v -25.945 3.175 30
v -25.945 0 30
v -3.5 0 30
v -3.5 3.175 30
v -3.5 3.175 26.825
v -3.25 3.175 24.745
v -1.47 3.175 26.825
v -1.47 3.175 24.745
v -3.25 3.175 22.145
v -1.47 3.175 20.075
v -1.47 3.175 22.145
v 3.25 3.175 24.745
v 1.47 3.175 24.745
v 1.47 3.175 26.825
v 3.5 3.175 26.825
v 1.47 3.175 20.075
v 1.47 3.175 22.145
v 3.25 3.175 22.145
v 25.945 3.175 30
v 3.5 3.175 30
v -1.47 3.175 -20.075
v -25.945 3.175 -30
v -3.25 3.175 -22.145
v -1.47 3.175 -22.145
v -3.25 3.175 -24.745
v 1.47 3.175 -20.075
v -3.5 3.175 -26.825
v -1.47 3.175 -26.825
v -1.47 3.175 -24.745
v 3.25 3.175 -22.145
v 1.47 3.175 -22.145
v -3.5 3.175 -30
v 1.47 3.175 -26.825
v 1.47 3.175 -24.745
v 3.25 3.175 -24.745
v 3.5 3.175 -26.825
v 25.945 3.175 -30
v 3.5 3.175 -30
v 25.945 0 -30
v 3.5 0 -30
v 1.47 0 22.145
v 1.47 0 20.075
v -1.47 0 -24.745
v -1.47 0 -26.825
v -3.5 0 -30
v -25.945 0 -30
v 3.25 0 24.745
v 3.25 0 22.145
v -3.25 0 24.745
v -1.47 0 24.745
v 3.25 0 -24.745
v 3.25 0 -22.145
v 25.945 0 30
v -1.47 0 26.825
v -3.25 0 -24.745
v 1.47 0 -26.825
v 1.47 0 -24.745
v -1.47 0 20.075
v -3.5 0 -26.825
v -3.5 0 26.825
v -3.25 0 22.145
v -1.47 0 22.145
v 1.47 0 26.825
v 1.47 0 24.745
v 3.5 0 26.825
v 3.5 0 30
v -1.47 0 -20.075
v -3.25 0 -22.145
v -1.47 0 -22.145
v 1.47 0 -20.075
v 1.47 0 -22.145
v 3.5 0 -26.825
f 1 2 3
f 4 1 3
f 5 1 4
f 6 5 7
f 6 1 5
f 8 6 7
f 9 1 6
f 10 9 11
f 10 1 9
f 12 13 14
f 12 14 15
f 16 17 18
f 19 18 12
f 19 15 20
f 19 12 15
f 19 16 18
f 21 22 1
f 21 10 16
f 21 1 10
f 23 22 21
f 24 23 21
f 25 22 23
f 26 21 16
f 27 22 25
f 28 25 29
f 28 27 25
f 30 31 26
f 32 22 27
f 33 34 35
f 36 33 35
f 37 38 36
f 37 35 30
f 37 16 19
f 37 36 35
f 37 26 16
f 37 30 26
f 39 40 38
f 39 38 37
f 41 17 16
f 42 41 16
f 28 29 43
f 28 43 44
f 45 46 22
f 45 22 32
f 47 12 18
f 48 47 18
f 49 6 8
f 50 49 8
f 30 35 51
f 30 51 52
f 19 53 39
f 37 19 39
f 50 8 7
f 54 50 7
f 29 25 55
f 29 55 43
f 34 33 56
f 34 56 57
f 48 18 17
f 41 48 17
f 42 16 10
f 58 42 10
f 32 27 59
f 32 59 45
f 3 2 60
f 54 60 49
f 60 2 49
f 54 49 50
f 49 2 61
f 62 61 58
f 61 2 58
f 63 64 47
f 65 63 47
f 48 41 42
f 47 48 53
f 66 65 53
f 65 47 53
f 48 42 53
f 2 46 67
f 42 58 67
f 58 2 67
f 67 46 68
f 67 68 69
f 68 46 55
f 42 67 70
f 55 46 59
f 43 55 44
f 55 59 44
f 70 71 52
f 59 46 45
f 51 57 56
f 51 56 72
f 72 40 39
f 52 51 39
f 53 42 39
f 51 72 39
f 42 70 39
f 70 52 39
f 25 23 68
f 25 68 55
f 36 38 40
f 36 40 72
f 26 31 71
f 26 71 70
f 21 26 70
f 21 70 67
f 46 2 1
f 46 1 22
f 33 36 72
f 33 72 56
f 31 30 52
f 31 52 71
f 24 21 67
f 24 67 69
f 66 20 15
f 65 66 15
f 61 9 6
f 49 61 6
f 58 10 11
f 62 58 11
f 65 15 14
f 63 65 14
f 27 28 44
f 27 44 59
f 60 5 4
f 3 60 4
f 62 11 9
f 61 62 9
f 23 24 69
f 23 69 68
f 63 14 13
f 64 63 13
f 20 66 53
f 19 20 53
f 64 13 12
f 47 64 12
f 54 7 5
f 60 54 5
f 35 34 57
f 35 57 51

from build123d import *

# Parameters (mm, degrees)
SKETCH1_W           = 51.89
SKETCH1_H           = 60
BOSS_EXTRUDE1_DEPTH = 3.175
CUT_EXTRUDE1_DEPTH  = 10


with BuildPart() as part:
    # Sketch1 → Boss-Extrude1 (new body)
    with BuildSketch(Plane(origin=(0, 0, 0), x_dir=(1, 0, 0), z_dir=(0, 1, 0))):
        Rectangle(SKETCH1_W, SKETCH1_H)
    extrude(amount=BOSS_EXTRUDE1_DEPTH)

    # Sketch2 → Cut-Extrude1 (cut)
    with BuildSketch(Plane(origin=(0, 3.175, 0), x_dir=(1, 0, 0), z_dir=(0, 1, 0))):
        Polygon((-3.5, 30), (3.5, 30), (3.5, 26.825), (1.47, 26.825), (1.47, 24.745), (3.25, 24.745), (3.25, 22.145), (1.47, 22.145), (1.47, 20.075), (-1.47, 20.075), (-1.47, 22.145), (-3.25, 22.145), (-3.25, 24.745), (-1.47, 24.745), (-1.47, 26.825), (-3.5, 26.825), align=None)
        Polygon((1.47, -26.825), (1.47, -24.745), (3.25, -24.745), (3.25, -22.145), (1.47, -22.145), (1.47, -20.075), (-1.47, -20.075), (-1.47, -22.145), (-3.25, -22.145), (-3.25, -24.745), (-1.47, -24.745), (-1.47, -26.825), (-3.5, -26.825), (-3.5, -30), (3.5, -30), (3.5, -26.825), align=None)
    extrude(amount=-CUT_EXTRUDE1_DEPTH, mode=Mode.SUBTRACT)


solid = part.part
